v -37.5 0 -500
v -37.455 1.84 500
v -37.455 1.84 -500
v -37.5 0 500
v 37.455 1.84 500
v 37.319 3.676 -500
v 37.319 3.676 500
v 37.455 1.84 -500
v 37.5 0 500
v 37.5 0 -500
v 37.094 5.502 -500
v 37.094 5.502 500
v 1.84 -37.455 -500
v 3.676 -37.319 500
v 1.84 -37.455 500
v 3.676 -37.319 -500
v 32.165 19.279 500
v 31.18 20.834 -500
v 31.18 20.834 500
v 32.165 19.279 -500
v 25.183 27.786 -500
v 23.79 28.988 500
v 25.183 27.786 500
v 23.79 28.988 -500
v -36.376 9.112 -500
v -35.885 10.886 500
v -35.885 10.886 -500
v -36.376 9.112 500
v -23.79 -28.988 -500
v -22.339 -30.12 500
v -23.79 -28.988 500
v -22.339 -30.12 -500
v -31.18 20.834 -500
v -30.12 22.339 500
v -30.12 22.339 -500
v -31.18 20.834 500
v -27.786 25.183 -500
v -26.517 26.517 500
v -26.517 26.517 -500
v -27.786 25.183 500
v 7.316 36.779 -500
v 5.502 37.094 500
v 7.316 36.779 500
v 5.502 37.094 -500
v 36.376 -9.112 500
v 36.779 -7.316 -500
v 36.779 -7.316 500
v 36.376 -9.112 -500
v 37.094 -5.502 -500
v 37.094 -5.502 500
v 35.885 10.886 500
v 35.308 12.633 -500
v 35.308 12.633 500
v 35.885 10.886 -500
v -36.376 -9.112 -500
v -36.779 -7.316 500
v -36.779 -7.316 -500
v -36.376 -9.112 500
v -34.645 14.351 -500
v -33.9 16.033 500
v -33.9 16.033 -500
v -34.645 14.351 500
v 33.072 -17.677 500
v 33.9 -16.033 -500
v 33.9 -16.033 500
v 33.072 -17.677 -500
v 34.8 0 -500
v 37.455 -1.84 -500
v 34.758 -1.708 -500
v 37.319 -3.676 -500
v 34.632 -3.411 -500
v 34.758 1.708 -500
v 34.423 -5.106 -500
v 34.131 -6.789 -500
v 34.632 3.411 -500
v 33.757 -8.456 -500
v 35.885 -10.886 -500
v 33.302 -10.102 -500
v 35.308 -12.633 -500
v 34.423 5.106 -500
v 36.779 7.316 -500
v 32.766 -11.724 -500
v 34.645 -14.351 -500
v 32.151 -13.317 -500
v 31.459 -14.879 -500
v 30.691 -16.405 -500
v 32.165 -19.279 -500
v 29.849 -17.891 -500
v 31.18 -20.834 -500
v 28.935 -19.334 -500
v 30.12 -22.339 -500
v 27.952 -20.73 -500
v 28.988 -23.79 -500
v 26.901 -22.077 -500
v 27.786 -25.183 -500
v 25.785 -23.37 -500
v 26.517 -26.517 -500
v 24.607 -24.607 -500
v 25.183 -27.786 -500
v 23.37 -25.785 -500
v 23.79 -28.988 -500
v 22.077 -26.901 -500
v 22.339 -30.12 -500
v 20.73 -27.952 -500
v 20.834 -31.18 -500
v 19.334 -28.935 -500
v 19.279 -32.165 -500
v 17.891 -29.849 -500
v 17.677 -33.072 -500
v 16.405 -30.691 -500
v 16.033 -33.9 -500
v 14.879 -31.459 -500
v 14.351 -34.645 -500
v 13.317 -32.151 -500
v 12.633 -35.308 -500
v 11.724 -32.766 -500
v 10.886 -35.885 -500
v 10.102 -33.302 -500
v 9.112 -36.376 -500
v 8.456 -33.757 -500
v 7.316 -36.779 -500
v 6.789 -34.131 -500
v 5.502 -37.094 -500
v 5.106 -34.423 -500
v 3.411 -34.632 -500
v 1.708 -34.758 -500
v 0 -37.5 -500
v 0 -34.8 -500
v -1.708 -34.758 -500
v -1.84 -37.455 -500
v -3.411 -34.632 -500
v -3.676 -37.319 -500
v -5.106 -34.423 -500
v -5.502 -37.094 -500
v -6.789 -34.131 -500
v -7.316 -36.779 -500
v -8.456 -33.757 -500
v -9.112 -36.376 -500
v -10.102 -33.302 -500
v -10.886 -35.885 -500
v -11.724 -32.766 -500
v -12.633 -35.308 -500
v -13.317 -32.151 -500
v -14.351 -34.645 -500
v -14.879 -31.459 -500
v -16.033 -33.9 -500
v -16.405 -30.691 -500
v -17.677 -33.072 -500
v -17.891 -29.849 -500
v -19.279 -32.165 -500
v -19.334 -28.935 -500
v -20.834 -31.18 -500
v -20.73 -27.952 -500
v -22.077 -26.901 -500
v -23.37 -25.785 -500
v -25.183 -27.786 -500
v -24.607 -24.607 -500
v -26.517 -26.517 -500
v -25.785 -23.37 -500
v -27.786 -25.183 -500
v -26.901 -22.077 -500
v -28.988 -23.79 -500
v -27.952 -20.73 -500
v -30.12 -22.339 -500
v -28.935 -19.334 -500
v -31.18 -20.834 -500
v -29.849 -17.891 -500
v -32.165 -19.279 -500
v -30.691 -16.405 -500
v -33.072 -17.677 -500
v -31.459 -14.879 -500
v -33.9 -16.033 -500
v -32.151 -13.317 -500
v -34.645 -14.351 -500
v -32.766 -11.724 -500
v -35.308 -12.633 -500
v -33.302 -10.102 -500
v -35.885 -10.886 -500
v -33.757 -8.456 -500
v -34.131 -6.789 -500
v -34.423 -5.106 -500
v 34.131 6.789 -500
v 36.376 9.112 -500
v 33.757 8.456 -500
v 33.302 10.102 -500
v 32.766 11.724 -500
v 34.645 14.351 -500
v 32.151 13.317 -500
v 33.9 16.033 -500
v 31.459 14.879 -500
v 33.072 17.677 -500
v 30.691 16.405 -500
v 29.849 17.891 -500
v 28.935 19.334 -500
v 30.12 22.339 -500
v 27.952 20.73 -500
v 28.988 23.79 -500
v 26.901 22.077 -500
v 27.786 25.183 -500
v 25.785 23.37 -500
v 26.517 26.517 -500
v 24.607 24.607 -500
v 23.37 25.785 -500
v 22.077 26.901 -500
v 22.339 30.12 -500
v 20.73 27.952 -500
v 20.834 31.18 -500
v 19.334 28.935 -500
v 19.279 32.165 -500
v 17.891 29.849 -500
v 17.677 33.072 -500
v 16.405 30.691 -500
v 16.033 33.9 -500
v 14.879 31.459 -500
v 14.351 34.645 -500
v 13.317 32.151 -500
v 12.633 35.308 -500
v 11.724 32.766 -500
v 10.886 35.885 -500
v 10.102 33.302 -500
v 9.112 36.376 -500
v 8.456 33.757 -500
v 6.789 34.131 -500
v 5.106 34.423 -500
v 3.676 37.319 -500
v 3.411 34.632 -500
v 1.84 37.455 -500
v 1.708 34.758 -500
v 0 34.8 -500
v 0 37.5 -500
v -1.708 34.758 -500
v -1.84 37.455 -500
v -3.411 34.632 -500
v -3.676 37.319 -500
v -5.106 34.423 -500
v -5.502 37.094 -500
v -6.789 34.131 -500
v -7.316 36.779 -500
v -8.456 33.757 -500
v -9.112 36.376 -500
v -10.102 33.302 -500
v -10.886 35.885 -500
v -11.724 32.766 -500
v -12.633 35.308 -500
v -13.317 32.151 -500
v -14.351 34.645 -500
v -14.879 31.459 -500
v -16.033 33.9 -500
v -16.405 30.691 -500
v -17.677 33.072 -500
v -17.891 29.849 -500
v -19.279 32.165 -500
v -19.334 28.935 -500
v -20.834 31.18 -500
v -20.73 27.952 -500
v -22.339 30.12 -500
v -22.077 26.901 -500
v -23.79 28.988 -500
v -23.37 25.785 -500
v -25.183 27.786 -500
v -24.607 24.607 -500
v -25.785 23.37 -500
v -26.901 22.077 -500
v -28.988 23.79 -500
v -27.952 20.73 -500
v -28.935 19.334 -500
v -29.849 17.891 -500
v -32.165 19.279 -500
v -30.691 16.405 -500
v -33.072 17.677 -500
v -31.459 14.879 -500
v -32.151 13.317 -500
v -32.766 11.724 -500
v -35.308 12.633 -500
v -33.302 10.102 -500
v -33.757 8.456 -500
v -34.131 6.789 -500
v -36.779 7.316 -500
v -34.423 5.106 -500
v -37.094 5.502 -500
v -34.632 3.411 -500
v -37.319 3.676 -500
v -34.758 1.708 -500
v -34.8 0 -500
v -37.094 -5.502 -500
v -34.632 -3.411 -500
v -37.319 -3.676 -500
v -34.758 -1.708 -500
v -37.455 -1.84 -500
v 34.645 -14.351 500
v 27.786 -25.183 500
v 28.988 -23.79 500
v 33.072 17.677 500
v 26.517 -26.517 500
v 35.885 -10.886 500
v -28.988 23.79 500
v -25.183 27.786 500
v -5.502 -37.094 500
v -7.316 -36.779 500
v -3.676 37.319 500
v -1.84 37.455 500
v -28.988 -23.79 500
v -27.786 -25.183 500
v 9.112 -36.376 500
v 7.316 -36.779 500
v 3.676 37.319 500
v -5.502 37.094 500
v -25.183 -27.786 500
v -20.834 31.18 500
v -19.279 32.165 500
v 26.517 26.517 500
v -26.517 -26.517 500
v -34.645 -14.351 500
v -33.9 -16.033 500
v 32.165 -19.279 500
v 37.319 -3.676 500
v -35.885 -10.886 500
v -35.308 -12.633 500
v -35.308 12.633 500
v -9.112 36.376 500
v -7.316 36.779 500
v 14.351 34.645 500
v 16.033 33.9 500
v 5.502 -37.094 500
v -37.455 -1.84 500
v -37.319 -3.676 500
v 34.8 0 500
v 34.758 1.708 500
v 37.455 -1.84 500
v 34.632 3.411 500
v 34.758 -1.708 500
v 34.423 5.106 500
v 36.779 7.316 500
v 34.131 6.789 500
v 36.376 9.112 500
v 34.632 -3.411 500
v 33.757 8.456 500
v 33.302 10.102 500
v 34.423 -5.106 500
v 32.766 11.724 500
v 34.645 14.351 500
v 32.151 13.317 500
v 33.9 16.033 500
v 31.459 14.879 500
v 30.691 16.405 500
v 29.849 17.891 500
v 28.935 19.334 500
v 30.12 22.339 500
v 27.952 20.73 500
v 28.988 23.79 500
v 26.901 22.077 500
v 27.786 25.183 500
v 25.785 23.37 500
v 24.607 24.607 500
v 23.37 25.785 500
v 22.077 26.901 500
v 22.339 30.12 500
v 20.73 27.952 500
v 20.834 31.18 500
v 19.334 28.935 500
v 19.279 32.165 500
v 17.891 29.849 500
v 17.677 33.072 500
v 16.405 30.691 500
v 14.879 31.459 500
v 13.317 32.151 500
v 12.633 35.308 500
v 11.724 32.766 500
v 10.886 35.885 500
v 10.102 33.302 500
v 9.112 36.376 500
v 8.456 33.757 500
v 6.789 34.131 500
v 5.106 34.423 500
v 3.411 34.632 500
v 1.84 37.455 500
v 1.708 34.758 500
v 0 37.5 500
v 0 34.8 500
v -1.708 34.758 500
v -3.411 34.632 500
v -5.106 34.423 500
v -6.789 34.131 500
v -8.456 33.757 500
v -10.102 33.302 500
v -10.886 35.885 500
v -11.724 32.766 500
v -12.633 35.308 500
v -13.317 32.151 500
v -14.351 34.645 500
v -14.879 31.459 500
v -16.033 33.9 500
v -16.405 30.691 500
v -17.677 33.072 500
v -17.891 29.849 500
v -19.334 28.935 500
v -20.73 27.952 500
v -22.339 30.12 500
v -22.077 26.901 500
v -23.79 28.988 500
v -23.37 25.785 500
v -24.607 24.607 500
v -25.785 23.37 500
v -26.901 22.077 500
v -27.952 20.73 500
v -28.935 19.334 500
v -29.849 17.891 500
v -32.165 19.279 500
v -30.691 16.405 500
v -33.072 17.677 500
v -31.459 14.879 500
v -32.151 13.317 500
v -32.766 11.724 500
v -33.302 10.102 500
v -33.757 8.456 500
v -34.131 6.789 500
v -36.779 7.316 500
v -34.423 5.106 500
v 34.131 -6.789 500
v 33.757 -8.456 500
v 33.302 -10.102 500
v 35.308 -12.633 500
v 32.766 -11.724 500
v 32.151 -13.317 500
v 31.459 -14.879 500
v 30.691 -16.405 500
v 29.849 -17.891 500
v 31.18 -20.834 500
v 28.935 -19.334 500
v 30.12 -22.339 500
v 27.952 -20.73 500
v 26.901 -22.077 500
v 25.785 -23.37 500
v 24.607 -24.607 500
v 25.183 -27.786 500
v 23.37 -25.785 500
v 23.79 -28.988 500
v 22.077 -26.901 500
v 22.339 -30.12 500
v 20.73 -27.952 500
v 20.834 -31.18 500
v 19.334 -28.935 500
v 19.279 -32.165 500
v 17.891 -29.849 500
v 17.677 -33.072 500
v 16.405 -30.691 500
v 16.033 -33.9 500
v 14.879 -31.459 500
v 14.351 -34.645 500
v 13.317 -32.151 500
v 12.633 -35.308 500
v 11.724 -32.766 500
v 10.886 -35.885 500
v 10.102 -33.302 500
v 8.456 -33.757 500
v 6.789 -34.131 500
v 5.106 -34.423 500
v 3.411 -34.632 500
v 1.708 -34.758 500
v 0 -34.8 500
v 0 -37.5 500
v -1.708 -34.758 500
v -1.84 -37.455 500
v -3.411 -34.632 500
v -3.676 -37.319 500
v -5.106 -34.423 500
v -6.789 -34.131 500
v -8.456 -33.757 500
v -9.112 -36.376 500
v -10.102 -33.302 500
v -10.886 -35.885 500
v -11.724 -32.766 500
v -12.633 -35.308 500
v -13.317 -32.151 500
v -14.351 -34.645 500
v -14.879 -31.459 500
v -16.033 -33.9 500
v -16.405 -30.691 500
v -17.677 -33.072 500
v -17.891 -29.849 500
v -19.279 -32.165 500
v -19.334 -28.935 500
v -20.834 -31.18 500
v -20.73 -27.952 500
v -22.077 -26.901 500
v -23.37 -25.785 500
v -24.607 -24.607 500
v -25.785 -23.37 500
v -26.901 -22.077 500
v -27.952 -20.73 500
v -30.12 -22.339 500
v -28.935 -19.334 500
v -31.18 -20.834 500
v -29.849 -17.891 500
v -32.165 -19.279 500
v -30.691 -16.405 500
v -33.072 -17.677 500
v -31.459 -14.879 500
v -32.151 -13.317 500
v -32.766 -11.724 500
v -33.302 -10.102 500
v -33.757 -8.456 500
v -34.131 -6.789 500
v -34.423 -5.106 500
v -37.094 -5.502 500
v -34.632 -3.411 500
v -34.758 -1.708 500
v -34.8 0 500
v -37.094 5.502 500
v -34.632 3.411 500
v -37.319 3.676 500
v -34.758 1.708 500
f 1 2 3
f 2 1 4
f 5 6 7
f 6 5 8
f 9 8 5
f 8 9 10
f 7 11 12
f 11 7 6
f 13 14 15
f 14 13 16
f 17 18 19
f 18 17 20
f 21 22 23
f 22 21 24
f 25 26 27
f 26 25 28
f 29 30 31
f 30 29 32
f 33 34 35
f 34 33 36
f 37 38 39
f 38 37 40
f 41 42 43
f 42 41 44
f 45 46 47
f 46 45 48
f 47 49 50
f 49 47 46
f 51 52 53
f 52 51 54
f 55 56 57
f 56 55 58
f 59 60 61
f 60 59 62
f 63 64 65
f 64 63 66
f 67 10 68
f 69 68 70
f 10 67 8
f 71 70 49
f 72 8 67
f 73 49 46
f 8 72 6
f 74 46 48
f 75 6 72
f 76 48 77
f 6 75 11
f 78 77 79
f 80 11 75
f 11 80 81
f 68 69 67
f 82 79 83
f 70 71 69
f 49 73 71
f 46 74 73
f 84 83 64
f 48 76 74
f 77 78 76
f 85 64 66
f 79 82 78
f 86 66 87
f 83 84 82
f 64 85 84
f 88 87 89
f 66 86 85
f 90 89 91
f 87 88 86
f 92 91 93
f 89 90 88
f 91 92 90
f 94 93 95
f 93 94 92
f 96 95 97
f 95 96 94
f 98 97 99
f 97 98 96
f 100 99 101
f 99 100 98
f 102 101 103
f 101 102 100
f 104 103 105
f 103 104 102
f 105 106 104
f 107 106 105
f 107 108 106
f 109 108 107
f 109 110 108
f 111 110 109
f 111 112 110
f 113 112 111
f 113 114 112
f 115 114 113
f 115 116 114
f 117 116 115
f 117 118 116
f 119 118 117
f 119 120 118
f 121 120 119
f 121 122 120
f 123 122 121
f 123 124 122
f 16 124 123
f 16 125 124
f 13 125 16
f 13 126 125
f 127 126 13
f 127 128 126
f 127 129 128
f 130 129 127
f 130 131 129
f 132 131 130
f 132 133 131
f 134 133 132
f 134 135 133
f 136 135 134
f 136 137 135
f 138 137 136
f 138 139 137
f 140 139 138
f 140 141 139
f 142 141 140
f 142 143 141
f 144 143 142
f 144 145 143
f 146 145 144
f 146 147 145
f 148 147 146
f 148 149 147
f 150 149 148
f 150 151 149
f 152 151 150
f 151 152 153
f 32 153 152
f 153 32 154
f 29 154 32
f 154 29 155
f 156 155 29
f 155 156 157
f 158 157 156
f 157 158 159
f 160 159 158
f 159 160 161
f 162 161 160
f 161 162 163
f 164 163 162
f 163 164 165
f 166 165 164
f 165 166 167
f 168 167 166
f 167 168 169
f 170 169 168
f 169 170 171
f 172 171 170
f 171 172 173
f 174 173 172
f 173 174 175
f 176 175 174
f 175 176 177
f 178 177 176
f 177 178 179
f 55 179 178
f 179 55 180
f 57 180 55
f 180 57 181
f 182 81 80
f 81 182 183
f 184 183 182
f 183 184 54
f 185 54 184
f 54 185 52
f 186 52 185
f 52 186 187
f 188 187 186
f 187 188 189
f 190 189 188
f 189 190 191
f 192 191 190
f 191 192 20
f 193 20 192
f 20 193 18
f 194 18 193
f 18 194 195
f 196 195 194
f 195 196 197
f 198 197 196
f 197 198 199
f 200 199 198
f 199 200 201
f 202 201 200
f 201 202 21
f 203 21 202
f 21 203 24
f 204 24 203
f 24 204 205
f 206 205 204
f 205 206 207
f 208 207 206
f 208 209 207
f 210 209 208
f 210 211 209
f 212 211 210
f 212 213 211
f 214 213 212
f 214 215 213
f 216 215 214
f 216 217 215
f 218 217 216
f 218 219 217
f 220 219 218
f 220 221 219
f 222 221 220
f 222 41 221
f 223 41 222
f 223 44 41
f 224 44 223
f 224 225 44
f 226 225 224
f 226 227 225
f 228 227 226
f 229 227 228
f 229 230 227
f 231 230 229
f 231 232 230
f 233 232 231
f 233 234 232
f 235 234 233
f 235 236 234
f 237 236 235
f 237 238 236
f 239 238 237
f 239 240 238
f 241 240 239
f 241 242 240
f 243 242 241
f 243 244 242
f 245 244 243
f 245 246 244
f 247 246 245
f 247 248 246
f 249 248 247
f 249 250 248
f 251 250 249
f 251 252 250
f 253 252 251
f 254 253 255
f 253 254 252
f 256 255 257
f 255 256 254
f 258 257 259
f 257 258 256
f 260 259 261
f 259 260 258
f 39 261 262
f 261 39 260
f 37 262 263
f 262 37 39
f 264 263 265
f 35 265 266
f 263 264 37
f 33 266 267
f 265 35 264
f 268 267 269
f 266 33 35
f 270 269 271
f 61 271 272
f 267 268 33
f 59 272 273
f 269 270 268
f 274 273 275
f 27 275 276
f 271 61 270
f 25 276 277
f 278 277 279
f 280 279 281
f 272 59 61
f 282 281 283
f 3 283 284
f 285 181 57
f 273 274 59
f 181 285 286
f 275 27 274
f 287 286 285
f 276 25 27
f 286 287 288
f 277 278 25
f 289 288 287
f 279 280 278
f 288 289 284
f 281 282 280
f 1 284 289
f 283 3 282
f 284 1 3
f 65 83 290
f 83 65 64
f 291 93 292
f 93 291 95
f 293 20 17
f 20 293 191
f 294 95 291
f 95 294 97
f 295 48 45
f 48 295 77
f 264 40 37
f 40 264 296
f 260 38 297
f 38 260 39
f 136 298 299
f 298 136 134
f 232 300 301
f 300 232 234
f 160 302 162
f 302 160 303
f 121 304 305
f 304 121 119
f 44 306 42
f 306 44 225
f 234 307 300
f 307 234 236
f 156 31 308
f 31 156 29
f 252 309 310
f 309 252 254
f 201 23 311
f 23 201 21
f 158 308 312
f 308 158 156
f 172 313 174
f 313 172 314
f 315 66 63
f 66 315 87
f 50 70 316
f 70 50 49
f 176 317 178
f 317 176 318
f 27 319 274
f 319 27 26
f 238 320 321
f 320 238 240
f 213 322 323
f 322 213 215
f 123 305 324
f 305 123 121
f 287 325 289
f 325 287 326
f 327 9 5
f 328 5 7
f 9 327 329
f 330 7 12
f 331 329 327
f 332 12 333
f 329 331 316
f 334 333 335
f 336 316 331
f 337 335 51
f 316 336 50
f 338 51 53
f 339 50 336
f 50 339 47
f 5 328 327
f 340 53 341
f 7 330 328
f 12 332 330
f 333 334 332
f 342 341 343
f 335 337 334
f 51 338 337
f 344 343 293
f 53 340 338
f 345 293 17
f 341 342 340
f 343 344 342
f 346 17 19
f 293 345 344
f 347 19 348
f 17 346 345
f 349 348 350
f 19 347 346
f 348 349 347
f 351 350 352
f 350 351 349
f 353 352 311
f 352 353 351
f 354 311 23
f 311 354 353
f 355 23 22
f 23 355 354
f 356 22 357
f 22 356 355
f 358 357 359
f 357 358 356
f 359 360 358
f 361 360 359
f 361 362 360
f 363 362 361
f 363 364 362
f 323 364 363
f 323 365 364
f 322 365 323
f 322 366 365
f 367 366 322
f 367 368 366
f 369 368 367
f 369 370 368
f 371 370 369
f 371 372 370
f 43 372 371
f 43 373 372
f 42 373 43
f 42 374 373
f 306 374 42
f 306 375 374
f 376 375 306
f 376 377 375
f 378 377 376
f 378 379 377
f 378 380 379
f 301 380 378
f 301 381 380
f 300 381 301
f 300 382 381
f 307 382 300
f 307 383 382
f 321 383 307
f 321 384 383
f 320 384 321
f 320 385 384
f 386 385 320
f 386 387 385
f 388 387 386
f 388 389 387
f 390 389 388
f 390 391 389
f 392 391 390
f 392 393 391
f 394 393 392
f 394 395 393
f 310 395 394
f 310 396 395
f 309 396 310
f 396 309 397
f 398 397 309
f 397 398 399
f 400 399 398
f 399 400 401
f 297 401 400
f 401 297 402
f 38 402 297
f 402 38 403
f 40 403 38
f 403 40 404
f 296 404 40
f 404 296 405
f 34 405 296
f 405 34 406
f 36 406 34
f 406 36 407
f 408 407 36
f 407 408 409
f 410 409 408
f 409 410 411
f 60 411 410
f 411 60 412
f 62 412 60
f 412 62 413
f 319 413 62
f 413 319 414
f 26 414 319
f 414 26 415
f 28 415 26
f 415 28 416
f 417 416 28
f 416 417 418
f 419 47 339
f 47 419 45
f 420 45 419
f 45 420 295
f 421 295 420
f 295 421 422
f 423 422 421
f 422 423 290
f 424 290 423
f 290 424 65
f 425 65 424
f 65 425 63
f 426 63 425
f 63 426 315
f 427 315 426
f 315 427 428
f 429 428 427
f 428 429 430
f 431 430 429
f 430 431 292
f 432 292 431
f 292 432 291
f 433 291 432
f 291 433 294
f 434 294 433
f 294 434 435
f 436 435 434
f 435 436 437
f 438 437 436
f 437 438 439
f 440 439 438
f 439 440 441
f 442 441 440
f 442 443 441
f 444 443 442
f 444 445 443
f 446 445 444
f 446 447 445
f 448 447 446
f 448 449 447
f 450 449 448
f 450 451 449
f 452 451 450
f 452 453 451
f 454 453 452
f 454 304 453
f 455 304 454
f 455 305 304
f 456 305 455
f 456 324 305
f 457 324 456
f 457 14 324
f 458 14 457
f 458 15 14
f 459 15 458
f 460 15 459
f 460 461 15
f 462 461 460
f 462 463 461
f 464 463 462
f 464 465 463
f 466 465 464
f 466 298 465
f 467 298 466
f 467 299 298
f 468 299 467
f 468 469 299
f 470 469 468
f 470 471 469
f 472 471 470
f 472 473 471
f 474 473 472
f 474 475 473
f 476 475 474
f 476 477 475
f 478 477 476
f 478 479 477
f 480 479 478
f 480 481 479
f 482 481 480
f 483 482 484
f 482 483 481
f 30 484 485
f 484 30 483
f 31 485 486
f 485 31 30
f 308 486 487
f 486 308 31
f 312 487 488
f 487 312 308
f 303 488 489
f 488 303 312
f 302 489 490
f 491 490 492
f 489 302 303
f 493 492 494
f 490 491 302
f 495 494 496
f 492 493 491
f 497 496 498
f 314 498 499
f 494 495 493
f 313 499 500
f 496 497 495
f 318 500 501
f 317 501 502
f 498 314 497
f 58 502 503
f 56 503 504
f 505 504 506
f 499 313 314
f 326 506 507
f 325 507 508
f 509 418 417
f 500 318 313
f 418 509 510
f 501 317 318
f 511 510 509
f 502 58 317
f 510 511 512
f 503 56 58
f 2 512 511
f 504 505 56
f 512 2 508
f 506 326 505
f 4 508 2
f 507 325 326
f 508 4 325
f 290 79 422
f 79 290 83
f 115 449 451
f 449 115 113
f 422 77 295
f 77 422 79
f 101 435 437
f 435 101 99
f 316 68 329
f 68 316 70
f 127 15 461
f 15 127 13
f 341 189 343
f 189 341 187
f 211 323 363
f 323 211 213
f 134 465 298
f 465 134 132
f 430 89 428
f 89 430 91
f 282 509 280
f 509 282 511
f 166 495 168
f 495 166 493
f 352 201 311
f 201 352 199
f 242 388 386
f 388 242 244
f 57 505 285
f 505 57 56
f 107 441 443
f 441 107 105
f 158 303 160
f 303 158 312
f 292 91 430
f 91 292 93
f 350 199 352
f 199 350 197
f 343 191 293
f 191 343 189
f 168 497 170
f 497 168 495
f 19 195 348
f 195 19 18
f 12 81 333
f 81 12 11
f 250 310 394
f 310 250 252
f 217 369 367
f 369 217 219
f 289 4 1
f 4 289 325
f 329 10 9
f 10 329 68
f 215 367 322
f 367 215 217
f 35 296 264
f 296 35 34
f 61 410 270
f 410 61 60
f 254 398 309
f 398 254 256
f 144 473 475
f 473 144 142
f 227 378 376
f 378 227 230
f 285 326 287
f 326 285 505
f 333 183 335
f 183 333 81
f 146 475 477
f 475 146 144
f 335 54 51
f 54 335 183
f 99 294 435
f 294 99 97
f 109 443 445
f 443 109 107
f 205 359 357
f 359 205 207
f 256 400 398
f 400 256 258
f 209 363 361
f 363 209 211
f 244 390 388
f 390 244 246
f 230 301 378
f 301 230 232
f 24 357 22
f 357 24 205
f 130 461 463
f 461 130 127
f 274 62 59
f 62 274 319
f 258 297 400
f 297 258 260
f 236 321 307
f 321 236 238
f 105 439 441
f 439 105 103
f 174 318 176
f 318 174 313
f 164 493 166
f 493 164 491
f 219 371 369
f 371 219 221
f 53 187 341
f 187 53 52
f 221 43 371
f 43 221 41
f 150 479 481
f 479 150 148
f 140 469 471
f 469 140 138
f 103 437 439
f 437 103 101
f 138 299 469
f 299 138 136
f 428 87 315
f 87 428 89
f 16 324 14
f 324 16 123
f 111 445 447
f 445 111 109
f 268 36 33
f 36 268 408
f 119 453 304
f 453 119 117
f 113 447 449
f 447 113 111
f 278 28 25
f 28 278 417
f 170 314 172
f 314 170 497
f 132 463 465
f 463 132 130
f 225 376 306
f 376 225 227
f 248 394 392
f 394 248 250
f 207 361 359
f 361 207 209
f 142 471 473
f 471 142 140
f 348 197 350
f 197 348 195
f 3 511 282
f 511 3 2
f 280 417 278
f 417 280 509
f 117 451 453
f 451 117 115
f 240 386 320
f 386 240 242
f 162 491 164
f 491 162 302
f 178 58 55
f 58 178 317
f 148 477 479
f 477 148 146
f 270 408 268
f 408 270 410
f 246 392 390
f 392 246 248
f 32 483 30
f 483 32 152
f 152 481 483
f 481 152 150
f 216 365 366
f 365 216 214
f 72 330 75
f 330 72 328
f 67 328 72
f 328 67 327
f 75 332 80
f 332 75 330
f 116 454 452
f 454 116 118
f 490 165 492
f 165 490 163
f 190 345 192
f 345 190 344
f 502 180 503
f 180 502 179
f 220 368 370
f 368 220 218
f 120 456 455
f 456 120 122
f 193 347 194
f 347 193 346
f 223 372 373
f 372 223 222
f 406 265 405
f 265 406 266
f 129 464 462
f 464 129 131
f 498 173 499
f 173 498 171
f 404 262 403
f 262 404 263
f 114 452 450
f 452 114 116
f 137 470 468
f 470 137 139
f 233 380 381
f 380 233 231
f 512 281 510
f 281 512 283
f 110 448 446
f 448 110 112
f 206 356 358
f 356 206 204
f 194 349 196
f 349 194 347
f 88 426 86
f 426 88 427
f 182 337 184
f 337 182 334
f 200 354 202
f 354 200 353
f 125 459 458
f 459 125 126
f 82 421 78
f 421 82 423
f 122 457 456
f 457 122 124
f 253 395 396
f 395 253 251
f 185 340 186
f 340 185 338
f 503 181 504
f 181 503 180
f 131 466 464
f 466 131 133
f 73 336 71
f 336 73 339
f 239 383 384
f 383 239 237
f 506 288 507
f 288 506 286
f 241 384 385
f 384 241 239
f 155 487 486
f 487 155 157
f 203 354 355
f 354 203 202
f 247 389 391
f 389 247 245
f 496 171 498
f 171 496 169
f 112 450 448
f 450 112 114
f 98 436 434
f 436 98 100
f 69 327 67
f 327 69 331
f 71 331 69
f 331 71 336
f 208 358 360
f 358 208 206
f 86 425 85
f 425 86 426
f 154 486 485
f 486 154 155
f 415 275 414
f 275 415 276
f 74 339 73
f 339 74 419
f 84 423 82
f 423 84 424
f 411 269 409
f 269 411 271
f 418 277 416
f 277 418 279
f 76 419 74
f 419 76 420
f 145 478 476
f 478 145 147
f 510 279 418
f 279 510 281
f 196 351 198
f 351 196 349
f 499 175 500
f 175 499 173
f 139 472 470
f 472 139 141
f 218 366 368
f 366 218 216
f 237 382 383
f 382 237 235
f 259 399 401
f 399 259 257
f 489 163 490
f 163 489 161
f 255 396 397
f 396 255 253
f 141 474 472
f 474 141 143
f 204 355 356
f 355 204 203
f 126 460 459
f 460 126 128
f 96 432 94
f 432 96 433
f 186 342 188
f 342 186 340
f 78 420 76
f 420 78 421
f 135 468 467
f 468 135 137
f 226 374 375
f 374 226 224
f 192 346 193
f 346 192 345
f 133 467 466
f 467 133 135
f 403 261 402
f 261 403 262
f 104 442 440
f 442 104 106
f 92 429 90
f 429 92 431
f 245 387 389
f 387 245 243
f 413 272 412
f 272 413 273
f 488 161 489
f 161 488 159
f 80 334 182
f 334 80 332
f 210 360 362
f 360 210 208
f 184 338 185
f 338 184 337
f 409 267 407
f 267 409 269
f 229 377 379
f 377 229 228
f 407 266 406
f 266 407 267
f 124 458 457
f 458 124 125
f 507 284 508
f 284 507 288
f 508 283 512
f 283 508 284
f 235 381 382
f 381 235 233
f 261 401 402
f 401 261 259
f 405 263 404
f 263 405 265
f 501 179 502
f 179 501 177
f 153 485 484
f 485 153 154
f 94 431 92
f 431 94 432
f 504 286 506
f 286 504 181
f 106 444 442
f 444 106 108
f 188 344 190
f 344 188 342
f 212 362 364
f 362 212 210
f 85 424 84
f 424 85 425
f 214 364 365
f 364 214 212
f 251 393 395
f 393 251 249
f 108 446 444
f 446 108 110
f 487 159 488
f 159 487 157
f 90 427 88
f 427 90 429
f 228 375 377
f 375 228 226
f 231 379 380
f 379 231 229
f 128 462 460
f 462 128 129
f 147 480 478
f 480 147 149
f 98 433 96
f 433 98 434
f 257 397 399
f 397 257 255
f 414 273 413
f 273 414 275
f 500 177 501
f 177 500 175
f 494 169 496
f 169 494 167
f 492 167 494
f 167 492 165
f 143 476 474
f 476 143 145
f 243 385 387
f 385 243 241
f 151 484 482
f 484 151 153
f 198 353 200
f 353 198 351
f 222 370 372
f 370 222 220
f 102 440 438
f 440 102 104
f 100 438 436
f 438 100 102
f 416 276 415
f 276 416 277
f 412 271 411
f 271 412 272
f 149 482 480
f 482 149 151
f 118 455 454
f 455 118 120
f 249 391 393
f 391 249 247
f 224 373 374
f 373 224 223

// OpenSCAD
$fn = 128;

// HT 75 pipe, length 1000 mm
// Assumptions (typical for HT DN75):
// - Outer diameter: 75 mm
// - Wall thickness: 2.7 mm
// - Straight pipe (no socket), centered at origin along Z

od = 75;
t  = 2.7;
id = od - 2*t;
L  = 1000;

module ht_pipe(od, id, L) {
    difference() {
        cylinder(h = L, d = od, center = true);
        cylinder(h = L + 2, d = id, center = true);
    }
}

ht_pipe(od, id, L);
